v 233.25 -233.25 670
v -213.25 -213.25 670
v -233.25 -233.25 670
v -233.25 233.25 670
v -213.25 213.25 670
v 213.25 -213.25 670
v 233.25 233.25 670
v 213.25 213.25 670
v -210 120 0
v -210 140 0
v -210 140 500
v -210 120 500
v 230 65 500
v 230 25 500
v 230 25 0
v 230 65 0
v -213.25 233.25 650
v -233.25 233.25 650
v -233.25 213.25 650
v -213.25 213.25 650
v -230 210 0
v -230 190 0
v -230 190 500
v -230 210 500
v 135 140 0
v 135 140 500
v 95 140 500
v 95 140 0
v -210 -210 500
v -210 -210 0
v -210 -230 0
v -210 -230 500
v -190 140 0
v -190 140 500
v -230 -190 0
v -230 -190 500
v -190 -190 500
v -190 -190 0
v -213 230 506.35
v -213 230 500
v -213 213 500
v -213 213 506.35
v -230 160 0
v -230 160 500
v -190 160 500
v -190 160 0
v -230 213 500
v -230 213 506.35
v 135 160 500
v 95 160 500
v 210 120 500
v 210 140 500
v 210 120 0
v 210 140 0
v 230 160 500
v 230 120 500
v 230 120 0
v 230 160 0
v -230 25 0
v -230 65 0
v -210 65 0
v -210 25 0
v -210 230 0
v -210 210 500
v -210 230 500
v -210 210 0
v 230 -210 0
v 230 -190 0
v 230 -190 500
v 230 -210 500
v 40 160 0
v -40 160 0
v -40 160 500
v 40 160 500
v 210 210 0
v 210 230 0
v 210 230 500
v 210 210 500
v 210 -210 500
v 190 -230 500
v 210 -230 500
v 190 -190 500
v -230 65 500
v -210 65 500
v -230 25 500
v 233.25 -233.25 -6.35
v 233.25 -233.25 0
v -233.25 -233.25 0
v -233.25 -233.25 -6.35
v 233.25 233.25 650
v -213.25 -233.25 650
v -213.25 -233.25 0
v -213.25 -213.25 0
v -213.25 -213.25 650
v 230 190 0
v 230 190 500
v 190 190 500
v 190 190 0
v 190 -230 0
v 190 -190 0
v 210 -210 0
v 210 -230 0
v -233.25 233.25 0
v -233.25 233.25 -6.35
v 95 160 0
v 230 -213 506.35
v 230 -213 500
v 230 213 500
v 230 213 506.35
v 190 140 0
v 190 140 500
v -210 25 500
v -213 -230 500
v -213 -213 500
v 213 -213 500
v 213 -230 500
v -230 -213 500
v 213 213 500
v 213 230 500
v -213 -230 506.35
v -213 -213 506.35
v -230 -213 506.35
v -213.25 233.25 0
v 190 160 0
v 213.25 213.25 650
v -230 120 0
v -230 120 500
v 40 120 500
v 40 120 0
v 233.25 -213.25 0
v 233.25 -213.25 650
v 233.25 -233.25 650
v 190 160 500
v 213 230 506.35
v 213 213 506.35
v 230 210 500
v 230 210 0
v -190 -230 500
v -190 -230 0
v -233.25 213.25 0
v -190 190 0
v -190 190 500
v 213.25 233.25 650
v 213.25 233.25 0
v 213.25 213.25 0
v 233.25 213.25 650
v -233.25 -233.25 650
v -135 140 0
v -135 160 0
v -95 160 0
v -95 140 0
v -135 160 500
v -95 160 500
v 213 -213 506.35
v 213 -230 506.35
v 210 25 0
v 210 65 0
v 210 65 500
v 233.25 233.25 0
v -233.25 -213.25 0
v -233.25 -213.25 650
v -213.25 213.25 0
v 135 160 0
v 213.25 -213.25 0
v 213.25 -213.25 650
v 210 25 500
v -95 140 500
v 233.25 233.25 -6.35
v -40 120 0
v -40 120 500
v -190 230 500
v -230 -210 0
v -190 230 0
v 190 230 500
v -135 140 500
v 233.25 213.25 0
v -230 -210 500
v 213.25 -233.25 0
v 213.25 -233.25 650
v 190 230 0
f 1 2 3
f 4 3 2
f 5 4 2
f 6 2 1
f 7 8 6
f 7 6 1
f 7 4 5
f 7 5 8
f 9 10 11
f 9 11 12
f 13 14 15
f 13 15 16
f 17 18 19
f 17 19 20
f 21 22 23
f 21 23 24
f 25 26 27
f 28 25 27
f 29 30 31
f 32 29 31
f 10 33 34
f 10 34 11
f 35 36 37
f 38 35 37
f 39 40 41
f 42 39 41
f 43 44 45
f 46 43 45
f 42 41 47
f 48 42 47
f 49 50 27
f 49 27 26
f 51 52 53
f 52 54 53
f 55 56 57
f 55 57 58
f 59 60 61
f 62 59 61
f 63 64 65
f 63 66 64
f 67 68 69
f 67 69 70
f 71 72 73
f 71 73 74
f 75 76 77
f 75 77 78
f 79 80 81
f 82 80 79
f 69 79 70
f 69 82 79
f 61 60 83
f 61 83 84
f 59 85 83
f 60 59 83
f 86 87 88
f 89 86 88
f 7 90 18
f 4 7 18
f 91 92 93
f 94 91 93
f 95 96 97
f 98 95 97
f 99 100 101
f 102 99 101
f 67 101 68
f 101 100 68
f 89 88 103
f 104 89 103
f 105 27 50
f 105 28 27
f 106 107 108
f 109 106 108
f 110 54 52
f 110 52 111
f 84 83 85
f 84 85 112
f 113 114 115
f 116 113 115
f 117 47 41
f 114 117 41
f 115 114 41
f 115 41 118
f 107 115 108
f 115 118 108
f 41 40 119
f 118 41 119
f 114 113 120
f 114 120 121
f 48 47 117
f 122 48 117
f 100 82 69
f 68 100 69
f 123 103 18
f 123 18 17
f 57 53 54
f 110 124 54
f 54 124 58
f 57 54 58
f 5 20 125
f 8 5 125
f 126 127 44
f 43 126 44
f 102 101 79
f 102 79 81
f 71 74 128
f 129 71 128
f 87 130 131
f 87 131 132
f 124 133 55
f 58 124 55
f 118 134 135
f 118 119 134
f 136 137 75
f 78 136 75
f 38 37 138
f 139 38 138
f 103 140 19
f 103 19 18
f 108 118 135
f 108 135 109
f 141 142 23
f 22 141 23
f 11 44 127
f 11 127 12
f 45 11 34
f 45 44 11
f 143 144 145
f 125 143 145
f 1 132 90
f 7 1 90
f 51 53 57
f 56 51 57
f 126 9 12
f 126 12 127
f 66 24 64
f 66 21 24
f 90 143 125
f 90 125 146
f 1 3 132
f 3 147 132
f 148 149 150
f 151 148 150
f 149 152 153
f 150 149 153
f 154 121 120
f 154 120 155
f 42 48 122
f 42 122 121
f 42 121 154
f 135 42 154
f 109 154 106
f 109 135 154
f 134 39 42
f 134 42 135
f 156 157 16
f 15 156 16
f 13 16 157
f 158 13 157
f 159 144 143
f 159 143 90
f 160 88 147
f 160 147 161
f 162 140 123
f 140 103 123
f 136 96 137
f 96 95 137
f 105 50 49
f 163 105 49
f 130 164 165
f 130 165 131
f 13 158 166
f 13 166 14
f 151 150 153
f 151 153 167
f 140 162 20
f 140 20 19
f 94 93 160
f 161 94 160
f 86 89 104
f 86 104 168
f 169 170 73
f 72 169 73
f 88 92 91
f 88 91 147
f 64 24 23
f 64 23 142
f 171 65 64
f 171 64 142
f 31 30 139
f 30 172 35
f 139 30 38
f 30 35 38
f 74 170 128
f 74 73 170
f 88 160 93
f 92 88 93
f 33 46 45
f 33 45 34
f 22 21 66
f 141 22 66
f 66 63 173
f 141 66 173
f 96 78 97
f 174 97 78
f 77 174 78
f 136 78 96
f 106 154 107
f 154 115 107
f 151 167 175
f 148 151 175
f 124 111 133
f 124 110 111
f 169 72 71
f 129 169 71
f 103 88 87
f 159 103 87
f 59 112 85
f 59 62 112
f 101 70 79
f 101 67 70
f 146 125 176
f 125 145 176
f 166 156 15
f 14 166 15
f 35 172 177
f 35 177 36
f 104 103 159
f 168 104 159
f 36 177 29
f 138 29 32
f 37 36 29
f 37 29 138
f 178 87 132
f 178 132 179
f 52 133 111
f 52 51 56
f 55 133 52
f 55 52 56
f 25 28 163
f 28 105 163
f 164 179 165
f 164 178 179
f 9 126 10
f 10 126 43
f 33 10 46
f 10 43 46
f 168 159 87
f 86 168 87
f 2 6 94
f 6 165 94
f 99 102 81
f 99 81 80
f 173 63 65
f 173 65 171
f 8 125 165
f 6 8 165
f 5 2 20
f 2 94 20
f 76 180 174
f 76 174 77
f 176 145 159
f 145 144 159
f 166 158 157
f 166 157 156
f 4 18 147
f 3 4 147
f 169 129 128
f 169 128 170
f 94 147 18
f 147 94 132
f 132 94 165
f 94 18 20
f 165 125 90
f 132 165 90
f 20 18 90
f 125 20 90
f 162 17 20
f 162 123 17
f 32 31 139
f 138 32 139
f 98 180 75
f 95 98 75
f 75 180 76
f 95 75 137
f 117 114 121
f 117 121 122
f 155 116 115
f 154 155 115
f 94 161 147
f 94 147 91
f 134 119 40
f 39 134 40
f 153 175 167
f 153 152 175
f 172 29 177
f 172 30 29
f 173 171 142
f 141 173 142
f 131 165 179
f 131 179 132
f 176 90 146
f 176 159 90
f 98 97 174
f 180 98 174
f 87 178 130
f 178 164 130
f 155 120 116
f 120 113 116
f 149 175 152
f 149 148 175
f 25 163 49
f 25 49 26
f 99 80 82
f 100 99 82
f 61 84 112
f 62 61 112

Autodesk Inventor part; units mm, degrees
ref_plane "YZ Plane" through (0, 0, 0) normal (1, 0, 0) x (0, 1, 0)
ref_plane "XZ Plane" through (0, 0, 0) normal (0, 1, 0) x (-1, 0, 0)
ref_plane "XY Plane" through (0, 0, 0) normal (0, 0, 1) x (1, 0, 0)
sketch "Sketch1" plane through (0, 0, 0) normal (0, 0, 1) x (1, 0, 0)
  line L0 (233.25, -233.25) -> (-233.25, -233.25)
  line L1 (-233.25, -233.25) -> (-233.25, 233.25)
  line L2 (-233.25, 233.25) -> (233.25, 233.25)
  line L3 (233.25, 233.25) -> (233.25, -233.25)
  line L4 (233.25, -233.25) -> (-233.25, 233.25) construction
  line L5 (-233.25, -233.25) -> (233.25, 233.25) construction
  line L6 (-233.25, 233.25) -> (-213.25, 233.25)
  line L7 (-213.25, 233.25) -> (-213.25, 213.25)
  line L8 (-213.25, 213.25) -> (-233.25, 213.25)
  line L9 (-233.25, 213.25) -> (-233.25, 233.25)
  line L10 (233.25, 233.25) -> (213.25, 233.25)
  line L11 (213.25, 233.25) -> (213.25, 213.25)
  line L12 (213.25, 213.25) -> (233.25, 213.25)
  line L13 (233.25, 213.25) -> (233.25, 233.25)
  line L14 (-233.25, -233.25) -> (-213.25, -233.25)
  line L15 (-213.25, -233.25) -> (-213.25, -213.25)
  line L16 (-213.25, -213.25) -> (-233.25, -213.25)
  line L17 (-233.25, -213.25) -> (-233.25, -233.25)
  line L18 (233.25, -233.25) -> (213.25, -233.25)
  line L19 (213.25, -233.25) -> (213.25, -213.25)
  line L20 (213.25, -213.25) -> (233.25, -213.25)
  line L21 (233.25, -213.25) -> (233.25, -233.25)
  line L22 (-190, 190) -> (-210, 190)
  line L23 (-210, 190) -> (-210, 230)
  line L24 (-210, 230) -> (-190, 230)
  line L25 (-190, 230) -> (-190, 190)
  line L26 (-190, 190) -> (-230, 190)
  line L27 (-230, 190) -> (-230, 210)
  line L28 (-230, 210) -> (-190, 210)
  line L29 (-190, 210) -> (-190, 190)
  line L30 (190, 230) -> (210, 230)
  line L31 (210, 230) -> (210, 190)
  line L32 (210, 190) -> (190, 190)
  line L33 (190, 190) -> (190, 230)
  line L34 (190, 190) -> (230, 190)
  line L35 (230, 190) -> (230, 210)
  line L36 (230, 210) -> (190, 210)
  line L37 (190, 210) -> (190, 190)
  line L38 (-230, -190) -> (-190, -190)
  line L39 (-190, -190) -> (-190, -210)
  line L40 (-190, -210) -> (-230, -210)
  line L41 (-230, -210) -> (-230, -190)
  line L42 (-190, -190) -> (-210, -190)
  line L43 (-210, -190) -> (-210, -230)
  line L44 (-210, -230) -> (-190, -230)
  line L45 (-190, -230) -> (-190, -190)
  line L46 (190, -190) -> (230, -190)
  line L47 (230, -190) -> (230, -210)
  line L48 (230, -210) -> (190, -210)
  line L49 (190, -210) -> (190, -190)
  line L50 (190, -190) -> (210, -190)
  line L51 (210, -190) -> (210, -230)
  line L52 (210, -230) -> (190, -230)
  line L53 (190, -230) -> (190, -190)
  line L54 (-40, 160) -> (40, 160)
  line L55 (40, 160) -> (40, 120)
  line L56 (40, 120) -> (-40, 120)
  line L57 (-40, 120) -> (-40, 160)
  circle A0 centre (-112.5, -82.5) radius 105
  circle A1 centre (112.5, -82.5) radius 105
  line L58 (-112.5, -82.5) -> (112.5, -82.5) construction
  line L59 (150, -180) -> (-150, -180)
  line L60 (-150, -180) -> (-150, 70)
  line L61 (-150, 70) -> (150, 70)
  line L62 (150, 70) -> (150, -180)
  line L63 (150, -180) -> (-150, 70) construction
  line L64 (-150, -180) -> (150, 70) construction
  line L65 (-230, 160) -> (-210, 160)
  line L66 (-210, 160) -> (-210, 120)
  line L67 (-210, 120) -> (-230, 120)
  line L68 (-230, 120) -> (-230, 160)
  line L69 (-230, 160) -> (-190, 160)
  line L70 (-190, 160) -> (-190, 140)
  line L71 (-190, 140) -> (-230, 140)
  line L72 (-230, 140) -> (-230, 160)
  line L73 (-135, 160) -> (-95, 160)
  line L74 (-95, 160) -> (-95, 140)
  line L75 (-95, 140) -> (-135, 140)
  line L76 (-135, 140) -> (-135, 160)
  line L77 (-230, 65) -> (-210, 65)
  line L78 (-210, 65) -> (-210, 25)
  line L79 (-210, 25) -> (-230, 25)
  line L80 (-230, 25) -> (-230, 65)
  line L81 (-210, 25) -> (-210, -190) construction
  line L82 (95, 160) -> (135, 160)
  line L83 (135, 160) -> (135, 140)
  line L84 (135, 140) -> (95, 140)
  line L85 (95, 140) -> (95, 160)
  line L86 (230, 140) -> (190, 140)
  line L87 (190, 140) -> (190, 160)
  line L88 (190, 160) -> (230, 160)
  line L89 (230, 160) -> (230, 140)
  line L90 (230, 160) -> (210, 160)
  line L91 (210, 160) -> (210, 120)
  line L92 (210, 120) -> (230, 120)
  line L93 (230, 120) -> (230, 160)
  line L94 (230, 65) -> (210, 65)
  line L95 (210, 65) -> (210, 25)
  line L96 (210, 25) -> (230, 25)
  line L97 (230, 25) -> (230, 65)
  point P0 (0, 0)
  point P1 (0, 233.25)
  point P2 (0, 160)
  point P3 (0, -82.5)
  point P4 (0, -55)
  point P5 (0, 70)
  point P6 (-210, -82.5)
  point P7 (-210, 140)
  point P8 (-210, 210)
  point P9 (210, 210)
  point P10 (210, 140)
  point P11 (210, -210)
  point P12 (-210, -210)
  dimension "d0" = 466.5
  dimension "d1" = 466.5
  dimension "d2" = 20
  dimension "d3" = 20
  dimension "d6" = 20
  dimension "d7" = 40
  dimension "d8" = 3.25
  dimension "d9" = 3.25
  dimension "d10" = 3.25
  dimension "d11" = 3.25
  dimension "d12" = 3.25
  dimension "d13" = 3.25
  dimension "d14" = 3.25
  dimension "d15" = 3.25
  dimension "d16" = 80
  dimension "d17" = 40
  dimension "d19" = 70
  dimension "d20" = 210
  dimension "d21" = 210
  dimension "d22" = 225
  dimension "d26" = 300
  dimension "d27" = 250
  dimension "d28" = 50
  dimension "d29" = 150
  dimension "d30" = 40
  dimension "d31" = 20
  dimension "d32" = 55
  dimension "d33" = 55
  dimension "d36" = 55
  dimension "d37" = 55
extrude "Extrusion1" add sketch "Sketch1" against normal blind 6.35 contours L0 L19 L20 L3 | L0 L15 L16 L1 L8 L7 L2 L11 L12 L3 L20 L19 | L0 L1 L16 L15 | L12 L11 L2 L3 | L1 L2 L7 L8 | L22 L23 L28 L25 | L26 L27 L28 L23 | L28 L23 L24 L25 | L30 L31 L36 L33 | L36 L31 L32 L33 | L36 L35 L34 L31 | L38 L43 L40 L41 | L38 L39 L40 L43 | L40 L45 L44 L43 | L46 L51 L48 L49 | L46 L47 L48 L51 | L48 L51 L52 L53 | L54 L55 L56 L57 | A0 L59 L60 | A0 L60 L61 L62 A1 L59 | L60 L59 A0 | L59 L62 A1 | A1 L62 L59 | L65 L66 L71 L68 | L69 L70 L71 L66 | L71 L66 L67 L68 | L73 L74 L75 L76 | L77 L78 L79 L80 | L82 L83 L84 L85 | L93 L92 L91 L86 | L86 L91 L88 L89 | L86 L87 L88 L91 | L97 L96 L95 L94
extrude "Extrusion2" add sketch "Sketch1" along normal blind 500 separate body contours L22 L23 L28 L25 | L26 L27 L28 L23 | L28 L23 L24 L25 | L30 L31 L36 L33 | L36 L31 L32 L33 | L36 L35 L34 L31 | L38 L43 L40 L41 | L38 L39 L40 L43 | L40 L45 L44 L43 | L46 L51 L48 L49 | L46 L47 L48 L51 | L48 L51 L52 L53 | L54 L55 L56 L57 | L65 L66 L71 L68 | L69 L70 L71 L66 | L71 L66 L67 L68 | L73 L74 L75 L76 | L77 L78 L79 L80 | L82 L83 L84 L85 | L93 L92 L91 L86 | L86 L91 L88 L89 | L86 L87 L88 L91 | L97 L96 L95 L94
sketch "Sketch2" plane through (0, 0, 500) normal (0, 0, 1) x (1, 0, 0)
  line L0 (230, 210) -> (210, 210) projected
  line L1 (210, 210) -> (210, 230) projected
  line L2 (210, 230) -> (190, 230) projected
  line L3 (190, 230) -> (190, 190) projected
  line L4 (190, 190) -> (230, 190) projected
  line L5 (230, 190) -> (230, 210) projected
  line L6 (210, -230) -> (210, -210) projected
  line L7 (210, -210) -> (230, -210) projected
  line L8 (230, -210) -> (230, -190) projected
  line L9 (230, -190) -> (190, -190) projected
  line L10 (190, -190) -> (190, -230) projected
  line L11 (190, -230) -> (210, -230) projected
  line L12 (-230, -210) -> (-210, -210) projected
  line L13 (-210, -210) -> (-210, -230) projected
  line L14 (-210, -230) -> (-190, -230) projected
  line L15 (-190, -230) -> (-190, -190) projected
  line L16 (-190, -190) -> (-230, -190) projected
  line L17 (-230, -190) -> (-230, -210) projected
  line L18 (-210, 230) -> (-210, 210) projected
  line L19 (-210, 210) -> (-230, 210) projected
  line L20 (-230, 210) -> (-230, 190) projected
  line L21 (-230, 190) -> (-190, 190) projected
  line L22 (-190, 190) -> (-190, 230) projected
  line L23 (-190, 230) -> (-210, 230) projected
  line L24 (230, 230) -> (-230, 230)
  line L25 (-230, 230) -> (-230, -230)
  line L26 (-230, -230) -> (230, -230)
  line L27 (230, -230) -> (230, 230)
  line L28 (190, -230) -> (210, -230) projected
  line L29 (230, -210) -> (230, -190) projected
  line L30 (210, 230) -> (190, 230) projected
  line L31 (-230, 210) -> (-230, 190) projected
  line L32 (-233.25, 233.25) -> (233.25, 233.25) projected
  line L33 (-233.25, 233.25) -> (-213, 233.25)
  line L34 (-213, 233.25) -> (-213, 213)
  line L35 (-213, 213) -> (-233.25, 213)
  line L36 (-233.25, 213) -> (-233.25, 233.25)
  line L37 (233.25, 233.25) -> (213, 233.25)
  line L38 (213, 233.25) -> (213, 213)
  line L39 (213, 213) -> (233.25, 213)
  line L40 (233.25, 213) -> (233.25, 233.25)
  line L41 (233.25, -233.25) -> (213, -233.25)
  line L42 (213, -233.25) -> (213, -213)
  line L43 (213, -213) -> (233.25, -213)
  line L44 (233.25, -213) -> (233.25, -233.25)
  line L45 (-233.25, -233.25) -> (-213, -233.25)
  line L46 (-213, -233.25) -> (-213, -213)
  line L47 (-213, -213) -> (-233.25, -213)
  line L48 (-233.25, -213) -> (-233.25, -233.25)
  line L49 (-233.25, -233.25) -> (233.25, -233.25) projected
  point P0 (-230, -213)
  point P1 (-213, -230)
  point P2 (230, -213)
  point P3 (213, -230)
  point P4 (230, 213)
  point P5 (213, 230)
  point P6 (-230, 213)
  point P7 (-213, 230)
  dimension "d44" = 20.25
  dimension "d45" = 20.25
extrude "Extrusion3" add sketch "Sketch2" along normal blind 6.35 separate body contours L5 L4 L3 L2 L1 L0 | L0 L1 L24 L38 L39 L27 | L27 L9 L10 L26 L15 L16 L25 L21 L22 L24 L3 L4 | L8 L7 L6 L11 L10 L9 | L27 L43 L42 L26 L6 L7 | L22 L21 L20 L19 L18 L23 | L18 L19 L25 L35 L34 L24 | L14 L13 L12 L17 L16 L15 | L26 L46 L47 L25 L12 L13
extrude "Extrusion4" add sketch "Sketch1" along normal blind 650 separate body contours L0 L19 L20 L3 | L0 L1 L16 L15 | L12 L11 L2 L3 | L1 L2 L7 L8
sketch "Sketch3" plane through (0, 0, 650) normal (0, 0, 1) x (1, 0, 0)
  line L0 (-233.25, -213.25) -> (-233.25, -233.25) projected
  line L1 (-233.25, -233.25) -> (-213.25, -233.25) projected
  line L2 (-213.25, -233.25) -> (-213.25, -213.25) projected
  line L3 (-213.25, -213.25) -> (-233.25, -213.25) projected
  line L4 (-213.25, 213.25) -> (-213.25, 233.25) projected
  line L5 (-213.25, 233.25) -> (-233.25, 233.25) projected
  line L6 (-233.25, 233.25) -> (-233.25, 213.25) projected
  line L7 (-233.25, 213.25) -> (-213.25, 213.25) projected
  line L8 (233.25, 213.25) -> (233.25, 233.25) projected
  line L9 (233.25, 233.25) -> (213.25, 233.25) projected
  line L10 (213.25, 233.25) -> (213.25, 213.25) projected
  line L11 (213.25, 213.25) -> (233.25, 213.25) projected
  line L12 (213.25, -213.25) -> (213.25, -233.25) projected
  line L13 (213.25, -233.25) -> (233.25, -233.25) projected
  line L14 (233.25, -233.25) -> (233.25, -213.25) projected
  line L15 (233.25, -213.25) -> (213.25, -213.25) projected
  line L16 (233.25, -233.25) -> (-233.25, -233.25)
  line L17 (-233.25, -233.25) -> (-233.25, 233.25)
  line L18 (-233.25, 233.25) -> (233.25, 233.25)
  line L19 (233.25, 233.25) -> (233.25, -233.25)
  line L20 (-213.25, 213.25) -> (213.25, 213.25)
  line L21 (213.25, 213.25) -> (213.25, -213.25)
  line L22 (213.25, -213.25) -> (-213.25, -213.25)
  line L23 (-213.25, -213.25) -> (-213.25, 213.25)
  point P0 (0, 0)
extrude "Extrusion5" add sketch "Sketch3" along normal blind 20 separate body contours L3 L2 L1 L0 | L17 L7 L23 L3 | L22 L12 L16 L2 | L6 L5 L4 L7 | L15 L14 L13 L12 | L21 L11 L19 L15 | L4 L18 L10 L20 | L10 L9 L8 L11
equation "\"d1\" = d0"
equation "\"d10\" = d9"
equation "\"d11\" = d10"
equation "\"d12\" = d9"
equation "\"d13\" = d8"
equation "\"d14\" = d13"
equation "\"d15\" = d12"
equation "\"d32\" = d33"
equation "\"d36\" = d32"
equation "\"d37\" = d33"
properties part number "RevIII Refined Printer Envelope Study"
